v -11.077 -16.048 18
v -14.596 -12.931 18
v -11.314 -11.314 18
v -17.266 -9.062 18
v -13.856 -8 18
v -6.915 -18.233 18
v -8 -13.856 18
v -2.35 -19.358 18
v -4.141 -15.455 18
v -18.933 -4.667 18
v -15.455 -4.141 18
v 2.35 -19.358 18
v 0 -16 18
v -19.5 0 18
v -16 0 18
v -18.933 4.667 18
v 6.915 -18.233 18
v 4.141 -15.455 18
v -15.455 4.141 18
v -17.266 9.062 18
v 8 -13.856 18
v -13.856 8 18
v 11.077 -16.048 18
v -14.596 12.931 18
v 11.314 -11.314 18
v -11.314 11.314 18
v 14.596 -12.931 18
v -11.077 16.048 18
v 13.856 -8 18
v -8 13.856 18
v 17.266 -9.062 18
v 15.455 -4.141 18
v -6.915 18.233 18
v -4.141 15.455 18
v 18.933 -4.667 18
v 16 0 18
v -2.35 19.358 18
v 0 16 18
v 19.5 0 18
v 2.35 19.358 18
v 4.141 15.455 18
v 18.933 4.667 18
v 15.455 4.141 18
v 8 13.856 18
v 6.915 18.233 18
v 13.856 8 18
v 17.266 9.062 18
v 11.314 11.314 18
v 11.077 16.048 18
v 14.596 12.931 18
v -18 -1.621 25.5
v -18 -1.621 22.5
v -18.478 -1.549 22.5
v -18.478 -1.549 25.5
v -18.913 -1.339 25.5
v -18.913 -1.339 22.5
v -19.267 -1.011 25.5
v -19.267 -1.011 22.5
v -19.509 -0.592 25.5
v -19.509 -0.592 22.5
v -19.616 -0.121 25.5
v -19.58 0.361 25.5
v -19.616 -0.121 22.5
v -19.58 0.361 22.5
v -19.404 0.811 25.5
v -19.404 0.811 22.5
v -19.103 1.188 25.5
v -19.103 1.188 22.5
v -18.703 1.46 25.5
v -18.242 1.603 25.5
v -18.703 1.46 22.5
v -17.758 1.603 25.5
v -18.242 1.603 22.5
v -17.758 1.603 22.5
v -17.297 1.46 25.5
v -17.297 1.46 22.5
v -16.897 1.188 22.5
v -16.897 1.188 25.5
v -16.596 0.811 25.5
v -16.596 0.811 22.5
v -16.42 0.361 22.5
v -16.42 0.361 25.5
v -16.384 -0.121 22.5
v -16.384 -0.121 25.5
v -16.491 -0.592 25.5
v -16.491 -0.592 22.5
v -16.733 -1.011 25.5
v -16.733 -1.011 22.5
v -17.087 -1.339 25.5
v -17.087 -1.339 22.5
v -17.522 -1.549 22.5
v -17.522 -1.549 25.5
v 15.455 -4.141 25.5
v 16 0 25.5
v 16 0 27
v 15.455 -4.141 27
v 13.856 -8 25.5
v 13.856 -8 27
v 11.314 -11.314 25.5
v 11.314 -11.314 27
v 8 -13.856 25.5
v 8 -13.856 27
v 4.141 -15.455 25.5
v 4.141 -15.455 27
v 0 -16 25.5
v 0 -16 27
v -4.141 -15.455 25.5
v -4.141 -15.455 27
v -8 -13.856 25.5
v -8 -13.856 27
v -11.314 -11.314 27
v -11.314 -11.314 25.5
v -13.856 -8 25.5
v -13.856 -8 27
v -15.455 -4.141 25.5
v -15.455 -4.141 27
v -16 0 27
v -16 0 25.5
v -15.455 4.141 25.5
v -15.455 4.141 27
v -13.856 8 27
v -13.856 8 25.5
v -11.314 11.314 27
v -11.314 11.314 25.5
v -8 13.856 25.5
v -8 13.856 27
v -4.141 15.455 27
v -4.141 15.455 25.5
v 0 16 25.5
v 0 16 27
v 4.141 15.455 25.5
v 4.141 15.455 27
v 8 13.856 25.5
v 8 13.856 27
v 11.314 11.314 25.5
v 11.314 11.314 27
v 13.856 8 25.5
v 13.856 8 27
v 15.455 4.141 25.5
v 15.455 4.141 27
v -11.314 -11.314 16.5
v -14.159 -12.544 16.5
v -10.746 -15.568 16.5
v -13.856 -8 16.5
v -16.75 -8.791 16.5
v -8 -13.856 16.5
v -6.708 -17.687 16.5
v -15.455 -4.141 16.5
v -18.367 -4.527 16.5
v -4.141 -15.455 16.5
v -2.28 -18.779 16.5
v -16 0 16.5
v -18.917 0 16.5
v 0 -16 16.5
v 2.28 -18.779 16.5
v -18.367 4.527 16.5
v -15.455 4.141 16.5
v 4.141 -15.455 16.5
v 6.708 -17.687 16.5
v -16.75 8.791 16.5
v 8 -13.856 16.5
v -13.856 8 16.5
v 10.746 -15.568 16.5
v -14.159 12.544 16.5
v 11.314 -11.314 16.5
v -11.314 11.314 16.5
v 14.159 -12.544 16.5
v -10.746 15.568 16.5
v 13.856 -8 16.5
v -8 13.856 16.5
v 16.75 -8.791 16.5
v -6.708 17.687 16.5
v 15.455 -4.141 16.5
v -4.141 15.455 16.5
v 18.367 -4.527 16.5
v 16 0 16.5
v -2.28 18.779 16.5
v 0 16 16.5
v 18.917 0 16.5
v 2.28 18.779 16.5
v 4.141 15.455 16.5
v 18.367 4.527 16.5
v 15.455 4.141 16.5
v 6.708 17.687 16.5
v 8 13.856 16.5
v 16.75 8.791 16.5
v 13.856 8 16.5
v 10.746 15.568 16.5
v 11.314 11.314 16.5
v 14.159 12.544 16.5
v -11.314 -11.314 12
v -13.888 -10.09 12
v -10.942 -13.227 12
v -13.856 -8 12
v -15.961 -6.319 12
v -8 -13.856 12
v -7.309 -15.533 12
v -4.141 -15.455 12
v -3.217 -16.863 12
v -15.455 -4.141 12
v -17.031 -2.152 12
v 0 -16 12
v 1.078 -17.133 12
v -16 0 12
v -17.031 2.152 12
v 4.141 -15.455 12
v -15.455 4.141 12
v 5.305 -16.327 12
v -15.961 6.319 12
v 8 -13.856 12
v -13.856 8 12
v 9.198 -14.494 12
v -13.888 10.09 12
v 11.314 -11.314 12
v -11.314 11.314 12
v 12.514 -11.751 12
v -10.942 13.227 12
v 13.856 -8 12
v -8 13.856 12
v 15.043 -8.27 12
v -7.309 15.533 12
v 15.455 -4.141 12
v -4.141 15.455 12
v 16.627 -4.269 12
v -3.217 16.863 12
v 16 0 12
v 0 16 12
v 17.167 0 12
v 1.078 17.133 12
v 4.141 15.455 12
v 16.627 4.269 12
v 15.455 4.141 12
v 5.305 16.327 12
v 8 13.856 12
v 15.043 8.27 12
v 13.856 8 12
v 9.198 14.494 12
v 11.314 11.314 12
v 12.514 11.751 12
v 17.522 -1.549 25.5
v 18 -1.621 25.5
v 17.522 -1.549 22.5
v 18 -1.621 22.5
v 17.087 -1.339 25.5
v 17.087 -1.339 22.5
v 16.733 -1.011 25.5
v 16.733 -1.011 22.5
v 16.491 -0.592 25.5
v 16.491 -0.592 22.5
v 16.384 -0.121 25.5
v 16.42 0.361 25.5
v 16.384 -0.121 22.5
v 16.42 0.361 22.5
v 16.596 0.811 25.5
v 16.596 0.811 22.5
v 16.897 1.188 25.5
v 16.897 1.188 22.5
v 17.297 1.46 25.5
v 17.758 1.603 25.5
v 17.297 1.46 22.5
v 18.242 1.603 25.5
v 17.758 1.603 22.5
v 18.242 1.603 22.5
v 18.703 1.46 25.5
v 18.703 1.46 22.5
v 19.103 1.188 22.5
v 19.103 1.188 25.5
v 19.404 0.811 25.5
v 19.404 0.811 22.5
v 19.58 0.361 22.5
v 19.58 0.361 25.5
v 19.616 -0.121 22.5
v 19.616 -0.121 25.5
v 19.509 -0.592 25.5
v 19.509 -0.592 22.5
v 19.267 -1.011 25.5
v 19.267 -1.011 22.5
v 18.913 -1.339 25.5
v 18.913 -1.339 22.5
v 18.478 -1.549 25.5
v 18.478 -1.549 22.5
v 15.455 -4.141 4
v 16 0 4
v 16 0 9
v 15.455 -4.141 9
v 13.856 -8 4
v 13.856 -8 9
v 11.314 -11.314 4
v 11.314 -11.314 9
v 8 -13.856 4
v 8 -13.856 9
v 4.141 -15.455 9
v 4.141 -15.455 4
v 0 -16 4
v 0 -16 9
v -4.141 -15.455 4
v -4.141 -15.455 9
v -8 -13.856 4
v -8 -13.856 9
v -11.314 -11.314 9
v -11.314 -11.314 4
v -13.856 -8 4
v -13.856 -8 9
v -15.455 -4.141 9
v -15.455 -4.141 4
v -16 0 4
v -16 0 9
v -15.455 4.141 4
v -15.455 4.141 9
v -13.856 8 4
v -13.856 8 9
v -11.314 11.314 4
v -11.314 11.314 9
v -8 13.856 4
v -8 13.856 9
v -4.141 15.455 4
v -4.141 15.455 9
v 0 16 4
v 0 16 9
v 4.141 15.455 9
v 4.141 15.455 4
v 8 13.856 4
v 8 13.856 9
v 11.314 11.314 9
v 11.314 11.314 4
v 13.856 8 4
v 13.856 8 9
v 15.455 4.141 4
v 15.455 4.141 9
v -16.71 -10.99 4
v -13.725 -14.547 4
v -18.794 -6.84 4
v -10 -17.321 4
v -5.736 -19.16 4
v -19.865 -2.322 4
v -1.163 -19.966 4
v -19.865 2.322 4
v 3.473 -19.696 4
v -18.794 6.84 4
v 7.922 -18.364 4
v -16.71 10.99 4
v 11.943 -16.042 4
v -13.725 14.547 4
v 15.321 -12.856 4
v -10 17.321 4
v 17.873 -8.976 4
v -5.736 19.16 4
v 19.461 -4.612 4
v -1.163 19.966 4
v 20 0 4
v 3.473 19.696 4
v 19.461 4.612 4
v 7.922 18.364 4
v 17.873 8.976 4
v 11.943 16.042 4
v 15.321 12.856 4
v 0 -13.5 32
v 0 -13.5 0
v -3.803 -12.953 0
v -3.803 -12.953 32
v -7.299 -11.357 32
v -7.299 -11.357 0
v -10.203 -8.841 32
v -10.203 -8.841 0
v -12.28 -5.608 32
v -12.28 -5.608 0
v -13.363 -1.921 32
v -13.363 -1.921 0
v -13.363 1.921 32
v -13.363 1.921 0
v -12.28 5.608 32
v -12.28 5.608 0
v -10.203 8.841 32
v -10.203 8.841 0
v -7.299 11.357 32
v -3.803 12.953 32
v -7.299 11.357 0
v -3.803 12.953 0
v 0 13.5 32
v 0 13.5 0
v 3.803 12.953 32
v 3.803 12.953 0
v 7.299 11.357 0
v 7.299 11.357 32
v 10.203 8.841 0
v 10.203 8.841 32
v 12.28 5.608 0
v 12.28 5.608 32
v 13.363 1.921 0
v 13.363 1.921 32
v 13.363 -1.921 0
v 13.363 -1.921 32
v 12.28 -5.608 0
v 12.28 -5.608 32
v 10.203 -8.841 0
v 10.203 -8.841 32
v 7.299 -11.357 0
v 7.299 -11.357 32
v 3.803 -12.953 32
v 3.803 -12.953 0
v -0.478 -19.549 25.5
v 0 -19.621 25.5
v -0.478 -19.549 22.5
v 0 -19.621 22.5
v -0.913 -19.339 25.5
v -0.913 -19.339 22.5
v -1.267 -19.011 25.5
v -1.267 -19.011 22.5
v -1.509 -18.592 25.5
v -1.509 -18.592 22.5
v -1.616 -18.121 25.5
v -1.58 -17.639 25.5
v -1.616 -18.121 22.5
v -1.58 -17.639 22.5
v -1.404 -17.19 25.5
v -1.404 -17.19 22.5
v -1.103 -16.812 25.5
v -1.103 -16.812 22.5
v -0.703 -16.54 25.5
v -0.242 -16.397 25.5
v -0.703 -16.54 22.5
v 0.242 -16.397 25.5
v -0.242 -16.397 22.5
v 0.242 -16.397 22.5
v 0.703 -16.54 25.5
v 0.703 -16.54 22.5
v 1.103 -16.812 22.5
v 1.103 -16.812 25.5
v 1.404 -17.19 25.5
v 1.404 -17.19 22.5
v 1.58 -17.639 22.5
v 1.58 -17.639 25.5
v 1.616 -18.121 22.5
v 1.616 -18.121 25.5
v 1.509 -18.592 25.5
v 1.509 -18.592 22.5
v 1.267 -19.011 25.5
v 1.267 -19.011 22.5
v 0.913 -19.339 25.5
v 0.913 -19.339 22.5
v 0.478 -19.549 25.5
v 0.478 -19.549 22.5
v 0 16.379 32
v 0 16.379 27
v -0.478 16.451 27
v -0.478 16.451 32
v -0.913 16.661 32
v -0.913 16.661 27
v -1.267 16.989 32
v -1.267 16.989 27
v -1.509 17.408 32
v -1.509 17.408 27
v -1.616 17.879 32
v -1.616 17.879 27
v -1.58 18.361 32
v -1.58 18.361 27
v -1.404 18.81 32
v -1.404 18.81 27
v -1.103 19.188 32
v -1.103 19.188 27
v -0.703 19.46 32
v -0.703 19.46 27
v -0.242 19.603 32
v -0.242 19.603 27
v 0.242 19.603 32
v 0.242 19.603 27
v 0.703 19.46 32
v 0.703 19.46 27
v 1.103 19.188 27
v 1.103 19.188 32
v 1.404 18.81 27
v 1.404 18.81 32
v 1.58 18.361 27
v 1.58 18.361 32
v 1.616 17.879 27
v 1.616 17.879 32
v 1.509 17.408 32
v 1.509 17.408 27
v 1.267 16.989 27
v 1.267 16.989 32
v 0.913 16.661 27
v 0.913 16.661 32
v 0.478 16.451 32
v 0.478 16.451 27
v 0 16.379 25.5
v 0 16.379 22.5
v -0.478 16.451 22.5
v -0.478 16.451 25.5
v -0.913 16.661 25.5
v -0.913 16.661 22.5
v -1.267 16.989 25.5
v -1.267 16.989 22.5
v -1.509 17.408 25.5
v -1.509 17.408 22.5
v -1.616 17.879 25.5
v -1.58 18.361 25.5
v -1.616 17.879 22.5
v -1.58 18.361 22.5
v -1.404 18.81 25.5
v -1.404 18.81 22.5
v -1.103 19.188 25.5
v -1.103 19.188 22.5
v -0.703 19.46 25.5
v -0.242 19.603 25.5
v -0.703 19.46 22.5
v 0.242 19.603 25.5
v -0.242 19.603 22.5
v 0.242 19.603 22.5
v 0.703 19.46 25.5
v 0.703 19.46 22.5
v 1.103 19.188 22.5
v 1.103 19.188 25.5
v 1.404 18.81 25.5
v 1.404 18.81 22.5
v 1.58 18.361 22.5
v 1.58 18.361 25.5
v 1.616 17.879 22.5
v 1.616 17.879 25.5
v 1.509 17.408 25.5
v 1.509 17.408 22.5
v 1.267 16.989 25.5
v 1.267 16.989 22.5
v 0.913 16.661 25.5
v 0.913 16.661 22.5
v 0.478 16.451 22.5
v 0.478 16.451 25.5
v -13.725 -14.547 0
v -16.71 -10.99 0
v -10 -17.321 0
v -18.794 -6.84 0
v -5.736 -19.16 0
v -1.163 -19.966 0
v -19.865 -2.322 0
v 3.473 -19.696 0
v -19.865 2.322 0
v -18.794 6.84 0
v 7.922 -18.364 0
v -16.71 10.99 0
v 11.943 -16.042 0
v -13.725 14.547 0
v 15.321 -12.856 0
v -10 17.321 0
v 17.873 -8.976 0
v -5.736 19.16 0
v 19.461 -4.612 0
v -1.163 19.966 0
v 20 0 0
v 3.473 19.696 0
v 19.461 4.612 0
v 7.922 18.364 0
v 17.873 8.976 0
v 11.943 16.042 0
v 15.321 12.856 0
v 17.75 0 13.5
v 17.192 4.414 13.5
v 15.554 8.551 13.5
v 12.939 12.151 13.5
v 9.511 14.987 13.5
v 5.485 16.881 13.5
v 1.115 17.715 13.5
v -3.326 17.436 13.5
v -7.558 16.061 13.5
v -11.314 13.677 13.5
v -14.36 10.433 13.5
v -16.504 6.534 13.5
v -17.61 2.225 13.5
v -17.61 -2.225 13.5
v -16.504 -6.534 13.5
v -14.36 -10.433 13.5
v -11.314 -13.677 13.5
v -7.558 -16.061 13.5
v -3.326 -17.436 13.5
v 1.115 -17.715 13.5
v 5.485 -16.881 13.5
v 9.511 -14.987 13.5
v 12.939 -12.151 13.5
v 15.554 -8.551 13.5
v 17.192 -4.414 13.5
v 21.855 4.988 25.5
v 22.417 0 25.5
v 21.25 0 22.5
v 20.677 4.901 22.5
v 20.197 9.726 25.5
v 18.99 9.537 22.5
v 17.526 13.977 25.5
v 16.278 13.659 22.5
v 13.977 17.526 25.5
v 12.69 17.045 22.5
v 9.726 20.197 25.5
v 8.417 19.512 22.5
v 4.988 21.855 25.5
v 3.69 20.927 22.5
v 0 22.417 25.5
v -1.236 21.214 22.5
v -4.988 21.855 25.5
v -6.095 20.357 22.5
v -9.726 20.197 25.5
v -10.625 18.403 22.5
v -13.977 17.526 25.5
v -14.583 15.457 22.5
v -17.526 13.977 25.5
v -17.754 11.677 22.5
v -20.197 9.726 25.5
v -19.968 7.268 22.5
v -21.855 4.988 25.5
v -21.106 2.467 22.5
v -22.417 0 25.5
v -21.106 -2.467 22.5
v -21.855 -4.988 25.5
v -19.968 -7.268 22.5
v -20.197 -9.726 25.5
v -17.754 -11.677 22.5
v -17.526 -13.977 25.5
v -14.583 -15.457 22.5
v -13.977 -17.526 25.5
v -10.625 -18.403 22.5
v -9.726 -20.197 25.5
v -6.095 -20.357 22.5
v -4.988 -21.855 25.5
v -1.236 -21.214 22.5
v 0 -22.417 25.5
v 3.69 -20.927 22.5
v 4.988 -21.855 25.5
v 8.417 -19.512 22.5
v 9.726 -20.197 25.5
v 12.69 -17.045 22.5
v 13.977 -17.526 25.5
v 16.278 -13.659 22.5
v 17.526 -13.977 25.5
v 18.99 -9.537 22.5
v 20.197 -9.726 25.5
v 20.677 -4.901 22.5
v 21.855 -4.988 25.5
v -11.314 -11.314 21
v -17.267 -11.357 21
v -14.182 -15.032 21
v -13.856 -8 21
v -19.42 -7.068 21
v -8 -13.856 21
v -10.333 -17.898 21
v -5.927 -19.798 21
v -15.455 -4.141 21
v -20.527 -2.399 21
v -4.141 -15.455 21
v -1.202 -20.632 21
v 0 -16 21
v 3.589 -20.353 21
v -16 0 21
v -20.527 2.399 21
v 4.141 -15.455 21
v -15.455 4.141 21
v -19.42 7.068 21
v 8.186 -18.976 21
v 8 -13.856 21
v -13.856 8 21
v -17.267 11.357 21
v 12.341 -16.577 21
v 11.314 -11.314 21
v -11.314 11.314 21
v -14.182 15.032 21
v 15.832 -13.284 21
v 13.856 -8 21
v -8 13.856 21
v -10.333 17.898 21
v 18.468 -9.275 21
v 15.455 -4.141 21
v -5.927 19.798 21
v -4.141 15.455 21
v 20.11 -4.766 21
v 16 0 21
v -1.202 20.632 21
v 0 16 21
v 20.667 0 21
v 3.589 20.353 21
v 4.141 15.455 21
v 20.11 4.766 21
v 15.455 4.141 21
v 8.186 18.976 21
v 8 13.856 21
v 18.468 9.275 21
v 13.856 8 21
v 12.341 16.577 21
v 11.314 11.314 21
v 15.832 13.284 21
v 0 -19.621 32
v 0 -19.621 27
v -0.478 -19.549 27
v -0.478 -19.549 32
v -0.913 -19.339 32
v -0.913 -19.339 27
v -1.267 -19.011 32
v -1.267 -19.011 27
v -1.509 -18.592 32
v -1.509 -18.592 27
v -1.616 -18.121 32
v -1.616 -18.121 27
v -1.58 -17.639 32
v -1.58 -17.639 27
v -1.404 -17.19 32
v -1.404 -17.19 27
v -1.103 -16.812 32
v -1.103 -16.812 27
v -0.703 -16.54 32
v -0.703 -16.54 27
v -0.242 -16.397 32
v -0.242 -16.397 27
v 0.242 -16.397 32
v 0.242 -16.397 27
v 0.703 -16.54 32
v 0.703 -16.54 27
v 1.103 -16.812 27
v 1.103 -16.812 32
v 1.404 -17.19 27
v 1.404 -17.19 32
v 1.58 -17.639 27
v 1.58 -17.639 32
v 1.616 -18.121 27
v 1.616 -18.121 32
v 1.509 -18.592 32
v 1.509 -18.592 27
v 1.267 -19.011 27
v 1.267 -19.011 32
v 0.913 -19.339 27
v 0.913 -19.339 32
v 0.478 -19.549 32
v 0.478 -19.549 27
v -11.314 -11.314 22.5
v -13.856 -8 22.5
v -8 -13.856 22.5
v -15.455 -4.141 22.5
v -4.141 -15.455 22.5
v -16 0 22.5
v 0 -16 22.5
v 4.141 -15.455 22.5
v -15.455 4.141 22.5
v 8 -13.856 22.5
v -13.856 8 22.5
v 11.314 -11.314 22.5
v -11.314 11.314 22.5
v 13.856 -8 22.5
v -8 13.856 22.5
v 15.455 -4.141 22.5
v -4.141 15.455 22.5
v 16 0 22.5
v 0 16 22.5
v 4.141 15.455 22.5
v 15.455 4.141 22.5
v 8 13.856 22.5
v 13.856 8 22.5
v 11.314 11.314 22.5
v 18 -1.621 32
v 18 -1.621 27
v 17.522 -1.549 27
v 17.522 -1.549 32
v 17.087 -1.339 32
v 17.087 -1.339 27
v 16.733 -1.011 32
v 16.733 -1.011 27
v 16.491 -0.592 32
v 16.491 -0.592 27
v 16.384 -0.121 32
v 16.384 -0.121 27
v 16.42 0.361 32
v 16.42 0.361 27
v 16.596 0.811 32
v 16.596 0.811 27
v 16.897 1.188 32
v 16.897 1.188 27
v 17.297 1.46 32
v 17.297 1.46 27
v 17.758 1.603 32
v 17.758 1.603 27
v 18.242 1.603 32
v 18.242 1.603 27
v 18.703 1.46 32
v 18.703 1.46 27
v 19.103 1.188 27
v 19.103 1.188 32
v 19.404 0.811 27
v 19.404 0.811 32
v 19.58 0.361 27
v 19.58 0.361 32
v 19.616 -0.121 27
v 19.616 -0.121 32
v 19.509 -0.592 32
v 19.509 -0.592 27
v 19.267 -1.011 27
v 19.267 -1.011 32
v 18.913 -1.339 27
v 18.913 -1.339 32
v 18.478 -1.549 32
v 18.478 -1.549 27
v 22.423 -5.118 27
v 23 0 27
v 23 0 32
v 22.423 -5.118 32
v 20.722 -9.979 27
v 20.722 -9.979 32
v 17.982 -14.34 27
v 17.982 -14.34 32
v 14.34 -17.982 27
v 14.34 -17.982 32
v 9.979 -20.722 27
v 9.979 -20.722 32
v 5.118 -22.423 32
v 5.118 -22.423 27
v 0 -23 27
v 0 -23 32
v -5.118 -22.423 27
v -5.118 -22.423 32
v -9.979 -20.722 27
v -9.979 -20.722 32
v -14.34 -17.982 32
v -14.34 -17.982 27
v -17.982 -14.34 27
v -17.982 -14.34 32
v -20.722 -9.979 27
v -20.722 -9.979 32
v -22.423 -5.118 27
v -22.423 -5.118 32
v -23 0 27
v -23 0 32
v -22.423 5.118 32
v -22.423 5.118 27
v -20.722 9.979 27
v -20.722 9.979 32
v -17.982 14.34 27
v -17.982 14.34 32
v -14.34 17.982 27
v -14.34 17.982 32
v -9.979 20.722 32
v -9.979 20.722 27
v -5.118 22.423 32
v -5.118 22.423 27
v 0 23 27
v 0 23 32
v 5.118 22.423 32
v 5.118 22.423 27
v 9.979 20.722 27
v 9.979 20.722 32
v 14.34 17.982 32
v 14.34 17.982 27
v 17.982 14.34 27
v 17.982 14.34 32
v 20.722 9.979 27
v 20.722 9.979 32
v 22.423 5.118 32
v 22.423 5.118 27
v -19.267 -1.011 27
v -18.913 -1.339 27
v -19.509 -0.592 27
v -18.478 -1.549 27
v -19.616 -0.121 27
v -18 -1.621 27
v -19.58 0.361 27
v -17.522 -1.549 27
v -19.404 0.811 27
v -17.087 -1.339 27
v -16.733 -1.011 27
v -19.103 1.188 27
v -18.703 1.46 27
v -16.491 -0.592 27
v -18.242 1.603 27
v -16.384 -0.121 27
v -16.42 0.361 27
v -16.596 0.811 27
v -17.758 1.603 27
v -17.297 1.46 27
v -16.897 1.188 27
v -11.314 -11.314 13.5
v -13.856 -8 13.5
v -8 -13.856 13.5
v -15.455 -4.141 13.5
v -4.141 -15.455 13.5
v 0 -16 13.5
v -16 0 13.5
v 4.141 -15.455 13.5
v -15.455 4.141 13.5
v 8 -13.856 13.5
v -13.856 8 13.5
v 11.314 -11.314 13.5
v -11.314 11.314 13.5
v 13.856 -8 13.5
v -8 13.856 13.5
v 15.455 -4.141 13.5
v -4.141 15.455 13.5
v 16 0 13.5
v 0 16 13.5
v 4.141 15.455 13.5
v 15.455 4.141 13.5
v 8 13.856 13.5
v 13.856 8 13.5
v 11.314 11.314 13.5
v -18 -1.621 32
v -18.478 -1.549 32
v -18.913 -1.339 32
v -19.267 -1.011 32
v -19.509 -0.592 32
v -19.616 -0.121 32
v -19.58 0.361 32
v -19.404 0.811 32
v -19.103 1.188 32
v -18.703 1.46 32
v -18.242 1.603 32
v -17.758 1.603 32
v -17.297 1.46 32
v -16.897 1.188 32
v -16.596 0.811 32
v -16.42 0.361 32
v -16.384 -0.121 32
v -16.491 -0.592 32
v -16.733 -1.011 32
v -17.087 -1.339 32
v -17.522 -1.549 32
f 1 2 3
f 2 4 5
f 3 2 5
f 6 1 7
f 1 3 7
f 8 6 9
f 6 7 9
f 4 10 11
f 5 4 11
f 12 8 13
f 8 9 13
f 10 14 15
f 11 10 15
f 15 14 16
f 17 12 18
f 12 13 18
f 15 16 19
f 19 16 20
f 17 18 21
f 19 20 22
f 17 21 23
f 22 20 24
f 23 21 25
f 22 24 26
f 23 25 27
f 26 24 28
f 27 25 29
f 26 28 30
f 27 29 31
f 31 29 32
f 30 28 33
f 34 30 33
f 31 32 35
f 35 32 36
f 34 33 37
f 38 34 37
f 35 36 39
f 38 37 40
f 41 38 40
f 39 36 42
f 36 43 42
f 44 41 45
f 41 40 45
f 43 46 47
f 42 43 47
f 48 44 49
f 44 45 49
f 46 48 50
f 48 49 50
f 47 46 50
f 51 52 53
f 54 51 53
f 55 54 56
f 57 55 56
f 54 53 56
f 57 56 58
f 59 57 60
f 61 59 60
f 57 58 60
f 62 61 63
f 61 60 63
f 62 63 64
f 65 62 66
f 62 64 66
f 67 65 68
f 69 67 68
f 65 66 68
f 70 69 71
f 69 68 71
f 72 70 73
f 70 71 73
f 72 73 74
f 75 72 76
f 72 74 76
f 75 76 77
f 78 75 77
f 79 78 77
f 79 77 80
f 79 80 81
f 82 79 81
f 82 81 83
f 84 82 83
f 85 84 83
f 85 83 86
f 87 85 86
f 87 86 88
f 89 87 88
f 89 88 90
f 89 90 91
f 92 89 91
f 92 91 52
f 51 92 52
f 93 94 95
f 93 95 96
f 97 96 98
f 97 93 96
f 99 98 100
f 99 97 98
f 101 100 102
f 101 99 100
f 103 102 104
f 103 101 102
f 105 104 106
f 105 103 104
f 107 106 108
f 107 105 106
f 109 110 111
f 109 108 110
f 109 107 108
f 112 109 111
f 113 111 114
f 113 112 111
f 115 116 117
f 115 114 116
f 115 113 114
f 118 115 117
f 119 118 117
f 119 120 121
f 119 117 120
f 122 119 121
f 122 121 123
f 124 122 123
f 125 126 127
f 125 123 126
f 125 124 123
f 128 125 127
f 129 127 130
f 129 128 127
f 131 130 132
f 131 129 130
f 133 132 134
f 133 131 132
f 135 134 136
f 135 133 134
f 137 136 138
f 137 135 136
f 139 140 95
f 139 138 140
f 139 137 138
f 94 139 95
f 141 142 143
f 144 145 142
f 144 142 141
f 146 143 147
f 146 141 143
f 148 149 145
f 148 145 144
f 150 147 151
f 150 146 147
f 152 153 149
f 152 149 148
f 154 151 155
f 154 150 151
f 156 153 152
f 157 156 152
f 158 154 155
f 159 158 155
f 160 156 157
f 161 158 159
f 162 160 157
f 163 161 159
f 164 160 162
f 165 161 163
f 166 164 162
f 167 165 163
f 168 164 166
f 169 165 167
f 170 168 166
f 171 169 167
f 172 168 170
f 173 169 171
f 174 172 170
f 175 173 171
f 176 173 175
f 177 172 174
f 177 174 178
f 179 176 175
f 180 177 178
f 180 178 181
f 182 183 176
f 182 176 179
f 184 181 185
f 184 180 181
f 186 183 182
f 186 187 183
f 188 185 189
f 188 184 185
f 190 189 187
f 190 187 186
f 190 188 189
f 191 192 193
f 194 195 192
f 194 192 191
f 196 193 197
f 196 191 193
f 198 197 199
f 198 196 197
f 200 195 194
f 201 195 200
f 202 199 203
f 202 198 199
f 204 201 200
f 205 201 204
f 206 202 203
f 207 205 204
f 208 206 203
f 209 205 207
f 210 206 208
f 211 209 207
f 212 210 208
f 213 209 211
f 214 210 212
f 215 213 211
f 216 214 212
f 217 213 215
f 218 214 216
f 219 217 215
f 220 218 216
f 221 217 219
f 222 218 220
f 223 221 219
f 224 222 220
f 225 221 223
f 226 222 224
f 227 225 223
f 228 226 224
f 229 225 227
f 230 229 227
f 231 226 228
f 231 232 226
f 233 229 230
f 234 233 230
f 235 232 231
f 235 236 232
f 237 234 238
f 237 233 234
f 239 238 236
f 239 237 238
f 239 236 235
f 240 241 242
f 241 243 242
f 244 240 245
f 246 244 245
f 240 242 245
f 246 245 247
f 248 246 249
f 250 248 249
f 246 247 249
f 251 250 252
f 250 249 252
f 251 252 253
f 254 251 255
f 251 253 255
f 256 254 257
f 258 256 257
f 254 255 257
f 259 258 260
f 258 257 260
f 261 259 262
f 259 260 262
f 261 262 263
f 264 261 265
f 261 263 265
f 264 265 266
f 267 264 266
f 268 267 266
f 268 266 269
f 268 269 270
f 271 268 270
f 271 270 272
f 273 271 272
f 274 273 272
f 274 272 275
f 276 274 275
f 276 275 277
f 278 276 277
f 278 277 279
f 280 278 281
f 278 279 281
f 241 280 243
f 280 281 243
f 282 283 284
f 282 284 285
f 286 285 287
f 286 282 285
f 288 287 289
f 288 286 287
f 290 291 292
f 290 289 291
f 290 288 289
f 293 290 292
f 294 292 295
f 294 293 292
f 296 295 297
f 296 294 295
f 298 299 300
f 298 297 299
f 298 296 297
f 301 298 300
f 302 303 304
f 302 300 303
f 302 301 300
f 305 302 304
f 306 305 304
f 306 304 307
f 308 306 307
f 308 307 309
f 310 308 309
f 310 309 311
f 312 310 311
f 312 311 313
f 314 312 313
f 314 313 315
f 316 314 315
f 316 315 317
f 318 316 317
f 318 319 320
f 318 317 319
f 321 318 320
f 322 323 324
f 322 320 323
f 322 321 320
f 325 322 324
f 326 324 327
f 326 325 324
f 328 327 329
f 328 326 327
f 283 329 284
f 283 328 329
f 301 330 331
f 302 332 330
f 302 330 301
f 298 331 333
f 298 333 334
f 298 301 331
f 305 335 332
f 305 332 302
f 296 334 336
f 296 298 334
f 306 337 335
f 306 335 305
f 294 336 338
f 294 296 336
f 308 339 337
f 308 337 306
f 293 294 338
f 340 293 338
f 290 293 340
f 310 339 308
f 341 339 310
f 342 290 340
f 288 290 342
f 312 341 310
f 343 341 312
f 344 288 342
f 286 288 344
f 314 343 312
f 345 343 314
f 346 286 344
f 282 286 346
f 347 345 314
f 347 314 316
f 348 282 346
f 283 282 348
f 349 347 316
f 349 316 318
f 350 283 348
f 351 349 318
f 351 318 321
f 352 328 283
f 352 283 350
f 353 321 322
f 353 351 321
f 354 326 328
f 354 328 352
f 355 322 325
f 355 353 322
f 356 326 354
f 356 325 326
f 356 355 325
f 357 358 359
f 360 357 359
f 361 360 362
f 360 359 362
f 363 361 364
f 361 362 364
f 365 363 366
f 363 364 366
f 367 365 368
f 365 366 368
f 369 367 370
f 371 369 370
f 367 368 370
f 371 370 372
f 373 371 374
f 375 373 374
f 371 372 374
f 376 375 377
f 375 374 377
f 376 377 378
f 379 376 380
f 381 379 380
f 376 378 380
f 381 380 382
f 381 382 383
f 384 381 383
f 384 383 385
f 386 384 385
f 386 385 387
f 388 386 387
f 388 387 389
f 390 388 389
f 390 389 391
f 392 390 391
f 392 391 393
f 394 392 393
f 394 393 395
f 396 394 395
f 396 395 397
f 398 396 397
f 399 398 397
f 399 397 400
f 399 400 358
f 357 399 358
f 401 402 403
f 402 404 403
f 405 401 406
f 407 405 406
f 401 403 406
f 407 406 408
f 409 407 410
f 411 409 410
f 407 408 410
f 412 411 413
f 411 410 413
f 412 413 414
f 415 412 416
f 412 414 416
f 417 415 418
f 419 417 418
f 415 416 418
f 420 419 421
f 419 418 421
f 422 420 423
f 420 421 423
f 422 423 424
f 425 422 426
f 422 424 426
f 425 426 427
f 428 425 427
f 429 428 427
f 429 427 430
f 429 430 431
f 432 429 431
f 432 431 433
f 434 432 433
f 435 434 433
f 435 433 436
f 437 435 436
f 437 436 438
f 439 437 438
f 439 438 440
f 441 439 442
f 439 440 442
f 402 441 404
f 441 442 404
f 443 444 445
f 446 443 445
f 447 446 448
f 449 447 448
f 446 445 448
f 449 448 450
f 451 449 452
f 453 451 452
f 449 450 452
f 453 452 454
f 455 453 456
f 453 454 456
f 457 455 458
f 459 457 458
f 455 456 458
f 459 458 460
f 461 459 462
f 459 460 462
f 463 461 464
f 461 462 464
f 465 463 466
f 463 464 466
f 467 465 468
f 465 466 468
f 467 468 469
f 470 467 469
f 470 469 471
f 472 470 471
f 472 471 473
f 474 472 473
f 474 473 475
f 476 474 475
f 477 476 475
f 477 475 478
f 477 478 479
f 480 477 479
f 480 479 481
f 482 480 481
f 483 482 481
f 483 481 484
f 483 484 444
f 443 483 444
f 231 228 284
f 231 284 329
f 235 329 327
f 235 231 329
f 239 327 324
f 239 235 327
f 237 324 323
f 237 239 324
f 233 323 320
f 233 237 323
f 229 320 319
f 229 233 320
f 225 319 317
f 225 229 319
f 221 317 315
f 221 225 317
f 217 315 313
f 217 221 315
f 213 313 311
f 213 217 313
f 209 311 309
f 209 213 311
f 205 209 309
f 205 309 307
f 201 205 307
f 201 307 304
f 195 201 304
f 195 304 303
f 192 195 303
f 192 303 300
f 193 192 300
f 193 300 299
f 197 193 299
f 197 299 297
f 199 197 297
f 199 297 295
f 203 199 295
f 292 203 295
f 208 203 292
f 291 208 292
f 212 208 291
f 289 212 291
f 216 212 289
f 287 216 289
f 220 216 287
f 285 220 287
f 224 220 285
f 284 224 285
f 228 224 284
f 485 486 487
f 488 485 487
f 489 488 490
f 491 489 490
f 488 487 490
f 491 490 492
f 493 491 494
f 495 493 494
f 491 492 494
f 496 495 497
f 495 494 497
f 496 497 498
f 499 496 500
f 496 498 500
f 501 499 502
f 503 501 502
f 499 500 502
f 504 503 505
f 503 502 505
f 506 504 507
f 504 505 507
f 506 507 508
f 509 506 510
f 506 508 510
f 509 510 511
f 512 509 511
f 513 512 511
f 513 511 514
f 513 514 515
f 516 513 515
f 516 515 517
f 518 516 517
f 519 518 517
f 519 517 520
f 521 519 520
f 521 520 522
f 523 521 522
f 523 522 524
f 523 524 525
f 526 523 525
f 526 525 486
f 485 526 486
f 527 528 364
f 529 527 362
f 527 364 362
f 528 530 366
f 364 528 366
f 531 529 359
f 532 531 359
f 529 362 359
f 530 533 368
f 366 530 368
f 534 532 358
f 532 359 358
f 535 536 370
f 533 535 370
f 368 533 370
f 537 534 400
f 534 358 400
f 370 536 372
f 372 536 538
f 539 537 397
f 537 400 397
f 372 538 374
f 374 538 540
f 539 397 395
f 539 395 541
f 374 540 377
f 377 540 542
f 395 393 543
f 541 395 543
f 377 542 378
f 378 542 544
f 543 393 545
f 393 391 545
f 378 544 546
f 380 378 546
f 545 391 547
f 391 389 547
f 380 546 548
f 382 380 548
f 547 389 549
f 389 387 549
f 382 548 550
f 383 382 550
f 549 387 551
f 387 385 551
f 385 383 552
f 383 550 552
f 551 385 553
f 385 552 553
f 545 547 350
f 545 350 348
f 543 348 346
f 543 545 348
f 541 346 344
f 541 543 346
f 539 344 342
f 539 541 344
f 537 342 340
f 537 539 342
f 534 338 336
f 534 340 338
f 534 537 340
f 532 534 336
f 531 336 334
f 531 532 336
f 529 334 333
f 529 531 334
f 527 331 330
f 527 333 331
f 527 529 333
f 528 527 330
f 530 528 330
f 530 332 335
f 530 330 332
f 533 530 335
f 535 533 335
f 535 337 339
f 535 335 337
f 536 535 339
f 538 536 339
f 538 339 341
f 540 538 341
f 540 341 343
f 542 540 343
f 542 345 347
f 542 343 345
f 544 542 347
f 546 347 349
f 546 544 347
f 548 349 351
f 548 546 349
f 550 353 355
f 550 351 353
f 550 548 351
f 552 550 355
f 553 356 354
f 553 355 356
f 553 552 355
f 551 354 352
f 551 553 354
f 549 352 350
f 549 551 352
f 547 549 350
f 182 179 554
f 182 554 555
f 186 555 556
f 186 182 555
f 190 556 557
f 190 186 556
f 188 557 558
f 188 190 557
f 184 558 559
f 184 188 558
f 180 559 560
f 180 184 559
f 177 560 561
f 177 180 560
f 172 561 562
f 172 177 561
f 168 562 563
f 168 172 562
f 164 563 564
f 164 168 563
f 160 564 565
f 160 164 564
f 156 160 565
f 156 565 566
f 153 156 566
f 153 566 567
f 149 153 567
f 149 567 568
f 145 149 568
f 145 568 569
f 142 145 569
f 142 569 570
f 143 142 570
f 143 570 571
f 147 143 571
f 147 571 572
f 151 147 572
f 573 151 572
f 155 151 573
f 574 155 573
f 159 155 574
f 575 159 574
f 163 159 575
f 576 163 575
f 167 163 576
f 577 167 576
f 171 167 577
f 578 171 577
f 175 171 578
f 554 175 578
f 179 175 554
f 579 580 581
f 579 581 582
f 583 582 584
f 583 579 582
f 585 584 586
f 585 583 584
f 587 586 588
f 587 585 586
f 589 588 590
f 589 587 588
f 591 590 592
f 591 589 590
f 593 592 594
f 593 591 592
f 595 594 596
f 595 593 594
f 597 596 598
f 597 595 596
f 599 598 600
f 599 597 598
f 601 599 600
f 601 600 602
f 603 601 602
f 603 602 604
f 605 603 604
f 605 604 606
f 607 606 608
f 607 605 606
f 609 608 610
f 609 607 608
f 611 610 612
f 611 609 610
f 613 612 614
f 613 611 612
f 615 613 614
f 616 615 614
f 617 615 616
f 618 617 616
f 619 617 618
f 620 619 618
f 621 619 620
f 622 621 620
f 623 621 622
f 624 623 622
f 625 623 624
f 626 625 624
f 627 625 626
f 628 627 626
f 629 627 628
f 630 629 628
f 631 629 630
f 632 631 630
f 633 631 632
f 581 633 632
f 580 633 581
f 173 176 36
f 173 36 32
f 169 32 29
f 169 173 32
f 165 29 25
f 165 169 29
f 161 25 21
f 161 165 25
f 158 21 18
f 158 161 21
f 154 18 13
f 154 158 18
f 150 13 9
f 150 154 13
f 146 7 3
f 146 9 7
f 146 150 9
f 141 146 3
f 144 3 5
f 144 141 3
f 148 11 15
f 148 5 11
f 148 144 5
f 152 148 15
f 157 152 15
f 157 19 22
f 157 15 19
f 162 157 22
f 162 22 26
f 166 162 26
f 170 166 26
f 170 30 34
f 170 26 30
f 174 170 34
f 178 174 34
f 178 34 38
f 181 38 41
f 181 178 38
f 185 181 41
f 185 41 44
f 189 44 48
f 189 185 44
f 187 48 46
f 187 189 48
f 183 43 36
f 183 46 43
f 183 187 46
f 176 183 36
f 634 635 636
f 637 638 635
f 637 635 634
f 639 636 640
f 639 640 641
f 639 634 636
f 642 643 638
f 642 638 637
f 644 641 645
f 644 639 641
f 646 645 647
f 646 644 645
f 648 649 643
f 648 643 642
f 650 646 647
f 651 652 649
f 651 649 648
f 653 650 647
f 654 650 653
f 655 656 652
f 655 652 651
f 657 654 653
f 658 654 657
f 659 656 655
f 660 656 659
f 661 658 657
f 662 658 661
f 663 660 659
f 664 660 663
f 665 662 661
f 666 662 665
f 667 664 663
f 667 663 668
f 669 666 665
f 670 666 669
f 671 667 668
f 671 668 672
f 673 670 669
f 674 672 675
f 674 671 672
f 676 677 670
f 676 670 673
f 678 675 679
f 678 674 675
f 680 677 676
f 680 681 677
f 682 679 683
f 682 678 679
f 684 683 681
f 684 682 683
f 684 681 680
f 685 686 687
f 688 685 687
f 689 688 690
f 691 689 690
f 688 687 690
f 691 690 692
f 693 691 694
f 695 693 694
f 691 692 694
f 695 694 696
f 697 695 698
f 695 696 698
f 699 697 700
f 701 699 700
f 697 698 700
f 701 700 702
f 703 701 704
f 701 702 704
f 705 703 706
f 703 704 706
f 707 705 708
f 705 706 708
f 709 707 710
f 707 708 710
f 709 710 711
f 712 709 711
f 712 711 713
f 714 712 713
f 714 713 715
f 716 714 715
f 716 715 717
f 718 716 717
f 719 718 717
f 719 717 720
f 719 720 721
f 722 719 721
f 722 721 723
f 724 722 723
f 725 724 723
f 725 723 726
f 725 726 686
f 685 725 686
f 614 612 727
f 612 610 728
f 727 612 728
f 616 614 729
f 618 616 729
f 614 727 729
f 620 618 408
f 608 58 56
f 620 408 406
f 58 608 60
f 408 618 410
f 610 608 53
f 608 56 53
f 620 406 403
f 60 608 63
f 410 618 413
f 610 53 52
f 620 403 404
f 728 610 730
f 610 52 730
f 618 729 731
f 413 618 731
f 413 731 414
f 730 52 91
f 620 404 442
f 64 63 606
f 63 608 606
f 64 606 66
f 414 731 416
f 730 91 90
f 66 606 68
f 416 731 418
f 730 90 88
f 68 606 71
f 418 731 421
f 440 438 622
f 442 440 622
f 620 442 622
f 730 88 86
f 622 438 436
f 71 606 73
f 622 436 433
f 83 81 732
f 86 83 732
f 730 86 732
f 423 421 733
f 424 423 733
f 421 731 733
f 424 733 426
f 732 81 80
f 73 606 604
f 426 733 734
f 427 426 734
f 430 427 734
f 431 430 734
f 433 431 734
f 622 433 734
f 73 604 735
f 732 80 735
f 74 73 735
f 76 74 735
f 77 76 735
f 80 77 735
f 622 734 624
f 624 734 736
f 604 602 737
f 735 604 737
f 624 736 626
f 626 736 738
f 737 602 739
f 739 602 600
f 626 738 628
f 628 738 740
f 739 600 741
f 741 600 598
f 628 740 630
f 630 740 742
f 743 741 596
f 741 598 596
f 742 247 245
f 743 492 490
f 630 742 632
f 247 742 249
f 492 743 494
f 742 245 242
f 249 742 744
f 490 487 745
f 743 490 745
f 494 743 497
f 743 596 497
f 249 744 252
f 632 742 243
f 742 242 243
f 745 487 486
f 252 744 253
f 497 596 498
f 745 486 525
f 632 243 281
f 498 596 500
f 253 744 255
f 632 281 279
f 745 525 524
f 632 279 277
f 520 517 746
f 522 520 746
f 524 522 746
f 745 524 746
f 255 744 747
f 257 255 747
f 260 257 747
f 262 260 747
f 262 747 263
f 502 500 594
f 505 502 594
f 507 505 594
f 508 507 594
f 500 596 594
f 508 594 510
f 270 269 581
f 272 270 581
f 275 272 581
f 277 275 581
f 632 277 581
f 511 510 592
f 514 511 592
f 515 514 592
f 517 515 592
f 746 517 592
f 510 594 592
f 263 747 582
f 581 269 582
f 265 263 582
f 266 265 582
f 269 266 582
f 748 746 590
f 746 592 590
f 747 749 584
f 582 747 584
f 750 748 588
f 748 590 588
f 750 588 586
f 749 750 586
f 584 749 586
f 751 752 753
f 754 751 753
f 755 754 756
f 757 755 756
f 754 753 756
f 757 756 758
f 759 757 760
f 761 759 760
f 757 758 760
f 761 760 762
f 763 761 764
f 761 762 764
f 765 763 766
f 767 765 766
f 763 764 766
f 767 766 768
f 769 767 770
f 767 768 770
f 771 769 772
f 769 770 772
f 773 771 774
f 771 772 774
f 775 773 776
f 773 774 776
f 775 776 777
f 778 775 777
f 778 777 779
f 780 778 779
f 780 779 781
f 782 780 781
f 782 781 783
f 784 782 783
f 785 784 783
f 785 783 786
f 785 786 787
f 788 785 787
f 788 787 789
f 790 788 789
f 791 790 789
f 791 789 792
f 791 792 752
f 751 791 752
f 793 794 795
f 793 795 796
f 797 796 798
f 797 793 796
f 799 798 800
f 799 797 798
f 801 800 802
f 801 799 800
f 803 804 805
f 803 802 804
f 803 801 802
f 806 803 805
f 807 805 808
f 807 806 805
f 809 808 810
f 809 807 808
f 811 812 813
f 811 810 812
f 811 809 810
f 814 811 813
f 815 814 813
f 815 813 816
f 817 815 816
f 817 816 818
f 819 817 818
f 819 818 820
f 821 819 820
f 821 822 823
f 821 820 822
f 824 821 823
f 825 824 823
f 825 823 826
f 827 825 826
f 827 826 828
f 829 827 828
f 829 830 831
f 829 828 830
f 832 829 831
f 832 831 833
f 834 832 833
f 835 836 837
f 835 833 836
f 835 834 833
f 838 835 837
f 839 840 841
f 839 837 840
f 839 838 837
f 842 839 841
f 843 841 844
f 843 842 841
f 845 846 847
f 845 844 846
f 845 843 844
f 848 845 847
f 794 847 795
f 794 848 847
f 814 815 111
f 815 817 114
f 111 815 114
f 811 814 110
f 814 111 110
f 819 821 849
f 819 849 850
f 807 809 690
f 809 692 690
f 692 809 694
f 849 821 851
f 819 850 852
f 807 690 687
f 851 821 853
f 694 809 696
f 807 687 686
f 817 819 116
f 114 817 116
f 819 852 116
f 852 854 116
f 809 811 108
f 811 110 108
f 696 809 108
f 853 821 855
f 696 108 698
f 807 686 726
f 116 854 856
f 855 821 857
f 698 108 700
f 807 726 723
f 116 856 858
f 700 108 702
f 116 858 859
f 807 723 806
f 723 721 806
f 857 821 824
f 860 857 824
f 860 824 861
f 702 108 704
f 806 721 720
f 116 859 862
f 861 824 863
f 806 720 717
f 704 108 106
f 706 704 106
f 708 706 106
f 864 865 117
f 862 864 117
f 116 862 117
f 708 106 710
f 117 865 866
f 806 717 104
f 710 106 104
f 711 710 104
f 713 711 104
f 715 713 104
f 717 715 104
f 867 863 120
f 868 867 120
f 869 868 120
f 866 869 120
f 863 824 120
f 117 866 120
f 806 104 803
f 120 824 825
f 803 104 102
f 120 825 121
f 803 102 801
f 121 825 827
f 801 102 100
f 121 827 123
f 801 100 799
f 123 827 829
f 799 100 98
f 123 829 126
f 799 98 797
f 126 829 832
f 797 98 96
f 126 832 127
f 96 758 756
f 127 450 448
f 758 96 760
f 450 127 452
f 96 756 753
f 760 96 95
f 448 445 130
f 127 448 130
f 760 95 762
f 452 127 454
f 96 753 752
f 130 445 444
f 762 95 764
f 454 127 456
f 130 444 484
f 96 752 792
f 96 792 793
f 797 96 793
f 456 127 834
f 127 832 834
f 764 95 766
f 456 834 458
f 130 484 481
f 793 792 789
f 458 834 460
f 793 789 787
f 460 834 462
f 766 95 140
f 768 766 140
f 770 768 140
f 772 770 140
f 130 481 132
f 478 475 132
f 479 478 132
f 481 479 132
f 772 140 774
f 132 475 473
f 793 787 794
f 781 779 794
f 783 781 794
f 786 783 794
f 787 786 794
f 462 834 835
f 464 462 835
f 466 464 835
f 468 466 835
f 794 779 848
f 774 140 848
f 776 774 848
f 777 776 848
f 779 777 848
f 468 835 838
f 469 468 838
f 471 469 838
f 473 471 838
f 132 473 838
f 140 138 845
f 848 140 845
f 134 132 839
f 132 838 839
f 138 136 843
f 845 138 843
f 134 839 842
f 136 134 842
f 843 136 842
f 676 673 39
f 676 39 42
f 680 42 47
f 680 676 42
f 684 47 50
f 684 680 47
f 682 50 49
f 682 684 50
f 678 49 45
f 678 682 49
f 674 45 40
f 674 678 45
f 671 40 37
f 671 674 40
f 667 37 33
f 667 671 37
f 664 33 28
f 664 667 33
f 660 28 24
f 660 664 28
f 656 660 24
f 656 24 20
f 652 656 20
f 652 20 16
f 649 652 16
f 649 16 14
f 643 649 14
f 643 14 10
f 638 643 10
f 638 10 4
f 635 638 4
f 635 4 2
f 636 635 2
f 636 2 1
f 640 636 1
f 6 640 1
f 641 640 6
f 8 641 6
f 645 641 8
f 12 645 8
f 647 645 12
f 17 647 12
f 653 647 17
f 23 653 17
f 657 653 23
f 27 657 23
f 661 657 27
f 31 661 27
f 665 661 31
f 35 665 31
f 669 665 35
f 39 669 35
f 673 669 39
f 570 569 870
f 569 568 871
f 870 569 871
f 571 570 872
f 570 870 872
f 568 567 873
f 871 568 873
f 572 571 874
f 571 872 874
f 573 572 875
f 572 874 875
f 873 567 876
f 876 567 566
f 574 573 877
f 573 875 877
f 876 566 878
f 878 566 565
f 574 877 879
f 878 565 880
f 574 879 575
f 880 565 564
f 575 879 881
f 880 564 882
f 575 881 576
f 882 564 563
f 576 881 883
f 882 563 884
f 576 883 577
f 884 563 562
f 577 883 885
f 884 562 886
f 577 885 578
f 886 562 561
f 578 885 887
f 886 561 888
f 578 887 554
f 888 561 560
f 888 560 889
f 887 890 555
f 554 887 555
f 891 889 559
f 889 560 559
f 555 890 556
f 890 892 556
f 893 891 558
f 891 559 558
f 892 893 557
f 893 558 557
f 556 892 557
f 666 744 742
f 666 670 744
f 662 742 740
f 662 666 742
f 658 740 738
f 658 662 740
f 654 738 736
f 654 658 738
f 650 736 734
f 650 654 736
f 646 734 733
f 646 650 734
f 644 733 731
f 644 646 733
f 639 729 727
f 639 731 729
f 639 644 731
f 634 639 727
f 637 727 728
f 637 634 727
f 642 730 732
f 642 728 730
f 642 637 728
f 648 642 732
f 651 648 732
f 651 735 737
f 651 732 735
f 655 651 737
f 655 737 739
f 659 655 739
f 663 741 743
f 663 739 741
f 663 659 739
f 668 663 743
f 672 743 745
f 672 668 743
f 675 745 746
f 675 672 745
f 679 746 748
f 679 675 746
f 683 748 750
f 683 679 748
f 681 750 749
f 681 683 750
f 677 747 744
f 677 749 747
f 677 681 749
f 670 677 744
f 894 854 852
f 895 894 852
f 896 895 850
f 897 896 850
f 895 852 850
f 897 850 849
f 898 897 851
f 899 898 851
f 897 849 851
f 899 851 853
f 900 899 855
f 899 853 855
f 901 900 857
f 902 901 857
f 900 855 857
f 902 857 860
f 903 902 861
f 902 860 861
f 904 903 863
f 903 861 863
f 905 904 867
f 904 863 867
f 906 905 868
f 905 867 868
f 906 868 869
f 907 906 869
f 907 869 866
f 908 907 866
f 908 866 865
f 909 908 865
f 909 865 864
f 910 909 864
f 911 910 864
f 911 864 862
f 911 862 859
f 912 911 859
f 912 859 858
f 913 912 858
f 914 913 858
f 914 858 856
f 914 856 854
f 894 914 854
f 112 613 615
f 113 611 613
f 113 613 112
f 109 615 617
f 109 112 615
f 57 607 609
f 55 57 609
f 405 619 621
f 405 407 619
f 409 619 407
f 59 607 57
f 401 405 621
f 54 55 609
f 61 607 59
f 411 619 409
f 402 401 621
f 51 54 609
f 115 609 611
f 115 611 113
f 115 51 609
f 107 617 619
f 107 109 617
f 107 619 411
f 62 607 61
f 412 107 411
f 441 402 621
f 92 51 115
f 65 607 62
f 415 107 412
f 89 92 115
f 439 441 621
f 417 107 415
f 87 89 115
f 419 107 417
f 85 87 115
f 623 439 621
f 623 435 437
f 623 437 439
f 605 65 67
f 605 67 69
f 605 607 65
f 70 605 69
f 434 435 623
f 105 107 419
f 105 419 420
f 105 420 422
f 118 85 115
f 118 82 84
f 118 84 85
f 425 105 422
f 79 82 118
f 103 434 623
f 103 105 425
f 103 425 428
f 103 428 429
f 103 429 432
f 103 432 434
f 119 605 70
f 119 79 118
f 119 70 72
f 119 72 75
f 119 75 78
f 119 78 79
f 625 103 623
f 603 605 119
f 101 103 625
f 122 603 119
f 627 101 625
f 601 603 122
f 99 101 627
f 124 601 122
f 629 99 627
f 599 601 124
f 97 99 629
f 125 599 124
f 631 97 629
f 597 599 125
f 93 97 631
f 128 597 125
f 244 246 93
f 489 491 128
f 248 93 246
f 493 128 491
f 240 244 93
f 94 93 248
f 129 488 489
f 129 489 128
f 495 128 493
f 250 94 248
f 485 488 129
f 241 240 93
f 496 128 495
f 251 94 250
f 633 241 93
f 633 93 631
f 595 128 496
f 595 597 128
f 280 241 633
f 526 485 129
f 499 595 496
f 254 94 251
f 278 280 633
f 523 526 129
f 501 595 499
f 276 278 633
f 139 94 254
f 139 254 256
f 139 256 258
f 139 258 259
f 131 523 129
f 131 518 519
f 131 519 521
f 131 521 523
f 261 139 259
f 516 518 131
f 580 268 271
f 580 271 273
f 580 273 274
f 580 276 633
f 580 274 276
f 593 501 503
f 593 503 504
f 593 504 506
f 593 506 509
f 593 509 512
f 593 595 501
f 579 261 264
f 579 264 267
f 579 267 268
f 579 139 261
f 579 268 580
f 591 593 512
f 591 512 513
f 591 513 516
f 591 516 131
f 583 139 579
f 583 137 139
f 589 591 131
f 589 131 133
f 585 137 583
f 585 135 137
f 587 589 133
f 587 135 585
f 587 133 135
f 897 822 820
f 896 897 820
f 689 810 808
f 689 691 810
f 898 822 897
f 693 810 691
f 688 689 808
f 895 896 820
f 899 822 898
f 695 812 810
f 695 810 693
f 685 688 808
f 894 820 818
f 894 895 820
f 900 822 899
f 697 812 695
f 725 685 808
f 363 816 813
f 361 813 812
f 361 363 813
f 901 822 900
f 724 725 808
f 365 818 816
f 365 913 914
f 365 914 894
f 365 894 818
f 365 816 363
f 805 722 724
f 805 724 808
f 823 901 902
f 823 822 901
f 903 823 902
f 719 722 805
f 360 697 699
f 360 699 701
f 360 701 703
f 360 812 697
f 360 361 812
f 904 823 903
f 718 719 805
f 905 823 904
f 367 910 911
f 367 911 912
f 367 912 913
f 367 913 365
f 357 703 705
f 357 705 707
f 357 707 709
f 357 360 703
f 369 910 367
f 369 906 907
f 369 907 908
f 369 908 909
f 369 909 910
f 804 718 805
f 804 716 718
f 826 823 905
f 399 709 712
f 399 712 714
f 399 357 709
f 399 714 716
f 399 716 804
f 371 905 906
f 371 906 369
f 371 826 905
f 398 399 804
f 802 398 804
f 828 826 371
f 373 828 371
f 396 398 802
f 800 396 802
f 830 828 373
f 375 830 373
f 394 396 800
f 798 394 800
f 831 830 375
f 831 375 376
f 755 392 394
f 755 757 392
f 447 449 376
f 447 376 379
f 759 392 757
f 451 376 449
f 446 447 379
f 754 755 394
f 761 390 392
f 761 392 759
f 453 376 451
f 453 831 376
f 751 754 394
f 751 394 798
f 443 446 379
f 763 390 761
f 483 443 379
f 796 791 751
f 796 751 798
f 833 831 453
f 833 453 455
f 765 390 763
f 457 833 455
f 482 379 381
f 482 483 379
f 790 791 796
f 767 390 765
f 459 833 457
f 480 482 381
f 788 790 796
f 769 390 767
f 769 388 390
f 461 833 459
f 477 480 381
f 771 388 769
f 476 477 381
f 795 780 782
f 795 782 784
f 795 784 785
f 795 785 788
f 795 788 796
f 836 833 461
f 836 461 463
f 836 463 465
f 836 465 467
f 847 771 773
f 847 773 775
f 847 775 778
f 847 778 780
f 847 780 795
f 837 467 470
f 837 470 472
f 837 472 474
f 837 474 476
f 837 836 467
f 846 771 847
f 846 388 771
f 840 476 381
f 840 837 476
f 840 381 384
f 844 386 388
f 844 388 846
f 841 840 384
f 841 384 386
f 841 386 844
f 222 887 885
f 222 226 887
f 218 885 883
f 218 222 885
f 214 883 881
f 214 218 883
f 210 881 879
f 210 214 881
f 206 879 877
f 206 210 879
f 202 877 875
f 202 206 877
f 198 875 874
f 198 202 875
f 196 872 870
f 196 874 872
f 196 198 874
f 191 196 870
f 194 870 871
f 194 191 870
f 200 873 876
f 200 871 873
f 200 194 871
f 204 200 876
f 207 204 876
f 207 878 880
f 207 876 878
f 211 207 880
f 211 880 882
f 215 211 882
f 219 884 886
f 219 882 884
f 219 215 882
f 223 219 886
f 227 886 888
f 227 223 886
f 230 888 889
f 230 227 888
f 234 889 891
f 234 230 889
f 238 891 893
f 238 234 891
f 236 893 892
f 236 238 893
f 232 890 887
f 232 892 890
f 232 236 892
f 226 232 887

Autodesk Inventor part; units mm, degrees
ref_plane "YZ Plane" through (0, 0, 0) normal (1, 0, 0) x (0, 1, 0)
ref_plane "XZ Plane" through (0, 0, 0) normal (0, 1, 0) x (-1, 0, 0)
ref_plane "XY Plane" through (0, 0, 0) normal (0, 0, 1) x (1, 0, 0)
sketch "Skizze1" plane through (0, 0, 0) normal (0, 1, 0) x (-1, 0, 0)
  line L0 (0, 0) -> (0, 32)
  line L1 (0, 32) -> (-23, 32)
  line L2 (-23, 32) -> (-23, 27)
  line L3 (-16, 9) -> (-16, 4)
  line L4 (-16, 4) -> (-20, 4)
  line L5 (-20, 4) -> (-20, 0)
  line L6 (-20, 0) -> (0, 0)
  line L7 (-23, 27) -> (-16, 27)
  line L8 (-16, 27) -> (-16, 25.5)
  line L9 (-16, 25.5) -> (-22.4167, 25.5)
  line L10 (-21.25, 22.5) -> (-16, 22.5)
  line L11 (-16, 22.5) -> (-16, 21)
  line L12 (-16, 21) -> (-20.6667, 21)
  line L13 (-19.5, 18) -> (-16, 18)
  line L14 (-16, 18) -> (-16, 16.5)
  line L15 (-16, 16.5) -> (-18.9167, 16.5)
  line L16 (-17.75, 13.5) -> (-16, 13.5)
  line L17 (-16, 13.5) -> (-16, 12)
  line L18 (-16, 12) -> (-17.1667, 12)
  line L19 (-16, 9) -> (-17.1667, 12)
  line L20 (-17.75, 13.5) -> (-18.9167, 16.5)
  line L21 (-19.5, 18) -> (-20.6667, 21)
  line L22 (-21.25, 22.5) -> (-22.4167, 25.5)
  point P0 (-17.75, 18)
  point P1 (-17.4583, 16.5)
  point P2 (-16.5833, 12)
  point P3 (-16.875, 13.5)
  dimension "d18" = 32
  dimension "d21" = 4
  dimension "d26" = 46
  dimension "d27" = 40
  dimension "d28" = 32
  dimension "d29" = 18
  dimension "d30" = 5
  dimension "d34" = 5
  dimension "d35" = 1.5
  dimension "d36" = 1.5
  dimension "d37" = 1.5
  dimension "d38" = 1.5
  dimension "d42" = 3
  dimension "d43" = 3
  dimension "d44" = 3
revolve "Umdrehung1" add sketch "Skizze1" angle 360 about axis through (0, 0, 0) along (0, 0, 1)
sketch "Skizze2" plane through (0, 0, 32) normal (0, 0, 1) x (1, 0, 0)
  circle A0 centre (0, 0) radius 18 construction
  point P0 (0, -18)
  point P1 (0, 18)
  point P2 (-18, 0)
  point P3 (18, 0)
  dimension "d46" = 36
hole "Bohrung1" at (0, -18, 32) at (0, 18, 32) at (-18, 0, 32) at (18, 0, 32) direction (0, 0, -1) diameter 3.242 depth 9.5 thread size "M4x0.7" class "6H" standard "ISO Metric profile"
sketch "Skizze3" plane through (0, 0, 32) normal (0, 0, 1) x (1, 0, 0)
  circle A0 centre (0, 0) radius 23 projected
hole "Bohrung2" at (0, 0, 32) direction (0, 0, -1) diameter 27 depth 32
equation "\"d36\" = d35"
equation "\"d37\" = d35"
equation "\"d38\" = d37"
properties part number "gehaeuse" material "Blei"
